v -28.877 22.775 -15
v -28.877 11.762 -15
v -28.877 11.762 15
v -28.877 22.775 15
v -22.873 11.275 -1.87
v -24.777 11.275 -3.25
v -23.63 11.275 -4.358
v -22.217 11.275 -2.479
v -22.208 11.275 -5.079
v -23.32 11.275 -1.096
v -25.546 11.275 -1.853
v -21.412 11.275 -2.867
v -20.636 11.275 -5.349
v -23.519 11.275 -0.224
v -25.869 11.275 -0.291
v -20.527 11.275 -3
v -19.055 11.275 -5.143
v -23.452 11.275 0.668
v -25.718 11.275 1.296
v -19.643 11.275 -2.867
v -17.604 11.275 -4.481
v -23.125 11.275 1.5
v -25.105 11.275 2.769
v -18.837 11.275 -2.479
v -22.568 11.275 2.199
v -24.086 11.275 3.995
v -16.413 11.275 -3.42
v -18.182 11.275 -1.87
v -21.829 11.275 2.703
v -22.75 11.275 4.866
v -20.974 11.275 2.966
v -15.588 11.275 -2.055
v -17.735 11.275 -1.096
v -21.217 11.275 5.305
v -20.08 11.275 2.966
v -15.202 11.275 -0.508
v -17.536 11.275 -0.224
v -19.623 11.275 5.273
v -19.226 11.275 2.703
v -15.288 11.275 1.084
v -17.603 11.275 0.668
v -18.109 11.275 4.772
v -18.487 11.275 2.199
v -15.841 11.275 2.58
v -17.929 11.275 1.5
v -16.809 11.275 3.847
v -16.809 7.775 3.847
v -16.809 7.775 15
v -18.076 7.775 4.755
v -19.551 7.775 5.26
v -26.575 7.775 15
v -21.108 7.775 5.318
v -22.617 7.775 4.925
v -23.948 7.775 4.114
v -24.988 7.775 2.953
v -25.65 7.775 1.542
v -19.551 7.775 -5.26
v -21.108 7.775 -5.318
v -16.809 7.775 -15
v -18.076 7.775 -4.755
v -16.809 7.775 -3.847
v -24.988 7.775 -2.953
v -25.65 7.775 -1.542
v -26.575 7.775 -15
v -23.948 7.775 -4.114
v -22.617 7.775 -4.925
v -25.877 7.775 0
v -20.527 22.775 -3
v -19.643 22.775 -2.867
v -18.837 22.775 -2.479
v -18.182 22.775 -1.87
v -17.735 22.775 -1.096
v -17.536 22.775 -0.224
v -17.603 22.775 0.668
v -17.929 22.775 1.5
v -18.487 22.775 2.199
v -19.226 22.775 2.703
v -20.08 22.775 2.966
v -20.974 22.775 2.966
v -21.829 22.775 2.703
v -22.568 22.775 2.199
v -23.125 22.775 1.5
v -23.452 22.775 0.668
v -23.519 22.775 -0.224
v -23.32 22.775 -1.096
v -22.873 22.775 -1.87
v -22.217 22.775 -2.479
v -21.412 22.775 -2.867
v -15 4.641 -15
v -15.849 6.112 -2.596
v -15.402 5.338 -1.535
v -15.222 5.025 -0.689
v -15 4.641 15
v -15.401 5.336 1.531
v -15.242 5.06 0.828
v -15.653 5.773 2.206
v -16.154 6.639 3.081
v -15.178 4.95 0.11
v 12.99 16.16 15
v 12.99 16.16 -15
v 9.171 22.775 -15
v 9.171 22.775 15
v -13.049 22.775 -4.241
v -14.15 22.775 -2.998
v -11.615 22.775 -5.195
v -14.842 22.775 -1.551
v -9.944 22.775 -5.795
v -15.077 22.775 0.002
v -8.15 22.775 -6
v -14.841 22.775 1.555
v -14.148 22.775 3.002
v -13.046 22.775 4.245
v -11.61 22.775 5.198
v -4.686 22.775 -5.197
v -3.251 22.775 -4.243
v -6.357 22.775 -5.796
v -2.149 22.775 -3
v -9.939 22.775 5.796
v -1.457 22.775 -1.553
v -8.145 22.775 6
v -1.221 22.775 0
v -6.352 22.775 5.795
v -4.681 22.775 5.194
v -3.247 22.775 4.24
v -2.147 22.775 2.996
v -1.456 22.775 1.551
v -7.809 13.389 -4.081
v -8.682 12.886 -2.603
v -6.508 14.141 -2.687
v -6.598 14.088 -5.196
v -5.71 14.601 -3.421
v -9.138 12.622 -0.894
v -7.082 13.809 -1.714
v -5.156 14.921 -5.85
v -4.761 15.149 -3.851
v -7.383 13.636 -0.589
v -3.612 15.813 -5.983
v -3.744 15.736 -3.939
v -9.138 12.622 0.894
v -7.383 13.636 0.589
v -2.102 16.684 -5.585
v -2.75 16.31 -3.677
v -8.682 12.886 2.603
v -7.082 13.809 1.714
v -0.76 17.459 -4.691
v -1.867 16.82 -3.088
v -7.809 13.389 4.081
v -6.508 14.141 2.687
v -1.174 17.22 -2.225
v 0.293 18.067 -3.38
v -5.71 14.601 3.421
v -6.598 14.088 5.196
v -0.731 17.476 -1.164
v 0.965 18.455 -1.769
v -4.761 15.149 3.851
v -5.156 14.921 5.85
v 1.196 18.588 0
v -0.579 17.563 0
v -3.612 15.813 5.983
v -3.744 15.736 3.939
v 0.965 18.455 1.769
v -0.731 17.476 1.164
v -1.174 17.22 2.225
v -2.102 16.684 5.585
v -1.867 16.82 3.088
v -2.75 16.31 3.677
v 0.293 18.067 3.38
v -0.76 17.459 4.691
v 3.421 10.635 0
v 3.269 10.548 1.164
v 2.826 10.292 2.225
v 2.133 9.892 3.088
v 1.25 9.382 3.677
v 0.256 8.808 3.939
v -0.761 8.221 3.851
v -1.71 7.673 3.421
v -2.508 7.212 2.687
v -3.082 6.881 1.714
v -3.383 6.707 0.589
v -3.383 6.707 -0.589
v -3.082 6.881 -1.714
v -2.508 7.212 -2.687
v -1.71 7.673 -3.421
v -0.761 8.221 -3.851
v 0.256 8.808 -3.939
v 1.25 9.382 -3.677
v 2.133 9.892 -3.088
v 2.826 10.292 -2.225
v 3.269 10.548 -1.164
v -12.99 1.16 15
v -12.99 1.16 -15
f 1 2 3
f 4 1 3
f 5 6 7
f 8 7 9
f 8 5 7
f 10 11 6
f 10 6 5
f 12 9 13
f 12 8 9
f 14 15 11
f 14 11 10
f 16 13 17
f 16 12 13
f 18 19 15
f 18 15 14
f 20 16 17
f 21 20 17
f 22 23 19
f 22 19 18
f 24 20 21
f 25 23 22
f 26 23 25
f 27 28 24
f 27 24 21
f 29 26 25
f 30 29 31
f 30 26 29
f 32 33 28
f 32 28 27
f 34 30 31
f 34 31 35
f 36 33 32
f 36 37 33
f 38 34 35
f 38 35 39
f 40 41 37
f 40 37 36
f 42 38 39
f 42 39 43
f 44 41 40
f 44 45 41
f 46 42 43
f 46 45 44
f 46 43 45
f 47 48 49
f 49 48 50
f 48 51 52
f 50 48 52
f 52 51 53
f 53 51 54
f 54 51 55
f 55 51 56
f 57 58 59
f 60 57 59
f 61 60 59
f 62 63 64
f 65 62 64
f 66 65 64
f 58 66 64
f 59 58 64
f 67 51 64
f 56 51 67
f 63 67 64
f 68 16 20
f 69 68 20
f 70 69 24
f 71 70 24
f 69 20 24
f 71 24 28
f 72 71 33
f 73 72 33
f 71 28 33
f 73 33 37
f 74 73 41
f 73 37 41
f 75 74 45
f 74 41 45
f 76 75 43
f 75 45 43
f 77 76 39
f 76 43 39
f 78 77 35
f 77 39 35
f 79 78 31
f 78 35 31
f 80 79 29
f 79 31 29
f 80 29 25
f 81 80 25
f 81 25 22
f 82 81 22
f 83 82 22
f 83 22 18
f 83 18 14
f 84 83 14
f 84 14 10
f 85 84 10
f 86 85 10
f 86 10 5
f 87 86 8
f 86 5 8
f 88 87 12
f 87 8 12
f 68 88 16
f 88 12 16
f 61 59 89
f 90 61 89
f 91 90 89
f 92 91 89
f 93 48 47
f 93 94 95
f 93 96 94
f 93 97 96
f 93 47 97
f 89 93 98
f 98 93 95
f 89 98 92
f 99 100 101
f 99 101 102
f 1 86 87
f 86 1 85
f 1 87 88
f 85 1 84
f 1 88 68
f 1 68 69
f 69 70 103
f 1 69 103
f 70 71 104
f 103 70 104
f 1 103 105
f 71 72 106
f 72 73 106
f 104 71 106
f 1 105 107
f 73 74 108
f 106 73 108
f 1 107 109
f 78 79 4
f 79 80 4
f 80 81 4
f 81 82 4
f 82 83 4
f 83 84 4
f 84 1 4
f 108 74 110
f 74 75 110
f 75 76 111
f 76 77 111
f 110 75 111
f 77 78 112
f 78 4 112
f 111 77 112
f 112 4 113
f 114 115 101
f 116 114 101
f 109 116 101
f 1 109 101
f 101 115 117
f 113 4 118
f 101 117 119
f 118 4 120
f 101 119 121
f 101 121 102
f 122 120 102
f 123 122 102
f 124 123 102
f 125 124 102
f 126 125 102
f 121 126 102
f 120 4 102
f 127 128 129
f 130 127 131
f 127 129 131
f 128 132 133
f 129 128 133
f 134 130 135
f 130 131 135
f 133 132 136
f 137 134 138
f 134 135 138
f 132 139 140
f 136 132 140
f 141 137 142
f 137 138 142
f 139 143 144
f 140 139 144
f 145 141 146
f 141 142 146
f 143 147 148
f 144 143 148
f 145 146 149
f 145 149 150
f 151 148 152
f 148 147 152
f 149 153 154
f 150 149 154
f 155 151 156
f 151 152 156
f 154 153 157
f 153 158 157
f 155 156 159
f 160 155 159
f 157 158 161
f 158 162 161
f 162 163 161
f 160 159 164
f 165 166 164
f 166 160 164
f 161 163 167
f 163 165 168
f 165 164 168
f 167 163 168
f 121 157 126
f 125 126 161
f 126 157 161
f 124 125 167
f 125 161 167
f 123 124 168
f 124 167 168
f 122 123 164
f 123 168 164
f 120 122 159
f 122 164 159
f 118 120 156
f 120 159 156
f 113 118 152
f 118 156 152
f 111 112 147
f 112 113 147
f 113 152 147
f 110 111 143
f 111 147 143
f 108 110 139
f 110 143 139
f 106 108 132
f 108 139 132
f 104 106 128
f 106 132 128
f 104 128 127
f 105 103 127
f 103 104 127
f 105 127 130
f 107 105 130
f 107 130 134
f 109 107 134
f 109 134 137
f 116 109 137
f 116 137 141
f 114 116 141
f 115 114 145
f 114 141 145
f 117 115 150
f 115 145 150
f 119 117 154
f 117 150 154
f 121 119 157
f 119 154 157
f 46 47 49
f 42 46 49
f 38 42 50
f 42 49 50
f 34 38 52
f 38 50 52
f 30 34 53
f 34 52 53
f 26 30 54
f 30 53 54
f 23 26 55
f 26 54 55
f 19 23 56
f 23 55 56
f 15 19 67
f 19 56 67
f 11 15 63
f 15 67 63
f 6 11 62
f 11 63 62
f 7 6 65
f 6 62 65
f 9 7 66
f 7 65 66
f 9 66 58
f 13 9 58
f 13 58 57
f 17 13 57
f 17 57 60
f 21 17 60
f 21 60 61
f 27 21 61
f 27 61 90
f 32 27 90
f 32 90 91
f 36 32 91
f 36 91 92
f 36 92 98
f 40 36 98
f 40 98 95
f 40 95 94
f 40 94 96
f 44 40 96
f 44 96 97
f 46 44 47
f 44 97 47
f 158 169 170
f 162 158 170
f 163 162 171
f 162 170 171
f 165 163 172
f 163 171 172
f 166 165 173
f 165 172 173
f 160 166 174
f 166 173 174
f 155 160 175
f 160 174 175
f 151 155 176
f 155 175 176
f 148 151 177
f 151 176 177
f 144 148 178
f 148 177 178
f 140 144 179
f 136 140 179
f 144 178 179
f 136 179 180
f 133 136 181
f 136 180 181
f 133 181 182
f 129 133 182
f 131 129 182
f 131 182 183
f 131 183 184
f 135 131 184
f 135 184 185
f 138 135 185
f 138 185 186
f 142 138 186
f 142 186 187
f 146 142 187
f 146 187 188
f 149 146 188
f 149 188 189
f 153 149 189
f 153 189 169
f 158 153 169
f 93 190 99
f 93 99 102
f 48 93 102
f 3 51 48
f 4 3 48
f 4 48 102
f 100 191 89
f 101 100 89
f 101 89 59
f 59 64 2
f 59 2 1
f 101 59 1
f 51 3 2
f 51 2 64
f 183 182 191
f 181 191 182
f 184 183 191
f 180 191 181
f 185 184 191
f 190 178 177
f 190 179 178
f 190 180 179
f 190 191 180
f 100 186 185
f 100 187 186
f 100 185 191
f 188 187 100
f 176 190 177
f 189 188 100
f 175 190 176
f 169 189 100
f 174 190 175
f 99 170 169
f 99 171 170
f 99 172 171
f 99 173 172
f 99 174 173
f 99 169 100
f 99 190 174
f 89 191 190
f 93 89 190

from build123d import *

# Parameters (mm, degrees)
ESBO_O1_W                  = 30
ESBO_O1_H                  = 30
RESSALTO_EXTRUS_O1_DEPTH   = 22.775
CORTE_EXTRUS_O1_DEPTH      = 41.542577927
ESBO_O3_OUTSIDE_W          = 48.998
ESBO_O3_OUTSIDE_H          = 41.63
ESBO_O3_OUTSIDE_W_2        = 30
ESBO_O3_OUTSIDE_H_2        = 30
CORTE_EXTRUS_O2_DEPTH      = 30.010251575
RESSALTO_EXTRUS_O2_DEPTH   = 30
ESBO_O5_R                  = 3.95
CORTE_EXTRUS_O3_DEPTH      = 32.012511133
CORTE_EXTRUS_O5_START      = -8
ESBO_O8_R                  = 6
CORTE_EXTRUS_O5_DEPTH      = 25
ESBO_O9_R                  = 3.95
CORTE_EXTRUS_O6_DEPTH      = 10
RESSALTO_EXTRUS_O3_DEPTH   = 15
ESBO_O11_W                 = 30
ESBO_O11_H                 = 15
RESSALTO_EXTRUS_O4_DEPTH   = 10
ESBO_O9_2_R                = 3.95
CORTE_EXTRUS_O7_DEPTH      = 30
ESBO_O12_R                 = 5.35
CORTE_EXTRUS_O8_DEPTH      = 10
CORTE_EXTRUS_O8_DEPTH_BACK = 3.5
ESBO_O13_W                 = 11.908257902
ESBO_O13_H                 = 30
CORTE_EXTRUS_O9_DEPTH      = 23.5
ESBO_O14_R                 = 3.95
ESBO_O14_R_2               = 3
RESSALTO_EXTRUS_O5_DEPTH   = 11.5
CORTE_EXTRUS_O10_DEPTH     = 30


with BuildPart() as part:
    # Esboço1 → Ressalto-extrusão1 (new body)
    with BuildSketch(Plane(origin=(0, 0, 0), x_dir=(1, 0, 0), z_dir=(0, 1, 0))):
        Rectangle(ESBO_O1_W, ESBO_O1_H)
    extrude(amount=RESSALTO_EXTRUS_O1_DEPTH)

    # Esboço2 → Corte-extrusão1 (cut, through all)
    with BuildSketch(Plane.XY.offset(15)):
        Polygon((-15, 0), (15, 17.320508076), (15, 0), align=None)
    extrude(amount=-CORTE_EXTRUS_O1_DEPTH, mode=Mode.SUBTRACT)

    # Esboço3 outside → Corte-extrusão2 (cut, through all)
    with BuildSketch(Plane(origin=(-3.75, 6.495190528, 0), x_dir=(0.8660254037844378, 0.5000000000000017, 0), z_dir=(0.5000000000000016, -0.8660254037844377, 0))):
        with Locations((5.694, 0)):
            Rectangle(ESBO_O3_OUTSIDE_W, ESBO_O3_OUTSIDE_H)
        with Locations((4.330127019, 0)):
            Rectangle(ESBO_O3_OUTSIDE_W_2, ESBO_O3_OUTSIDE_H_2, mode=Mode.SUBTRACT)
    extrude(amount=-CORTE_EXTRUS_O2_DEPTH, mode=Mode.SUBTRACT)

    # Esboço4 → Ressalto-extrusão2 (add)
    with BuildSketch(Plane.XY.offset(15)):
        Polygon((-25.469660456, 22.775), (-15, 4.641016151), (-15, 22.775), align=None)
    extrude(amount=-RESSALTO_EXTRUS_O2_DEPTH)

    # Esboço5 → Corte-extrusão3 (cut, through all)
    with BuildSketch(Plane(origin=(-3.75, 6.495190528, 0), x_dir=(-0.8660254037844379, -0.5000000000000013, 0), z_dir=(0.5000000000000013, -0.8660254037844379, 0))):
        with Locations(Location((-4.330131096, -4.077e-06, 0), (0, 0, 180))):
            Circle(ESBO_O5_R)
    extrude(amount=-CORTE_EXTRUS_O3_DEPTH, mode=Mode.SUBTRACT)

    # Esboço8 → Corte-extrusão5 (cut)
    with BuildSketch(Plane(origin=(-3.75, 6.495190528, 0), x_dir=(0.8660254037844379, 0.5000000000000013, 0), z_dir=(0.5000000000000013, -0.8660254037844379, 0)).offset(CORTE_EXTRUS_O5_START)):
        with Locations((4.330131096, 4.077e-06)):
            Circle(ESBO_O8_R)
    extrude(amount=-CORTE_EXTRUS_O5_DEPTH, mode=Mode.SUBTRACT)

    # Esboço9 → Corte-extrusão6 (cut)
    with BuildSketch(Plane(origin=(0, 22.775, 0), x_dir=(1, 0, 0), z_dir=(0, 1, 0))):
        with Locations(Location((-20.527350903, 0, 0), (0, 0, 270))):
            Circle(ESBO_O9_R)
    extrude(amount=-CORTE_EXTRUS_O6_DEPTH, mode=Mode.SUBTRACT)



with BuildPart() as body_2:
    # Esboço10 → Ressalto-extrusão3 (new body)
    with BuildSketch(Plane(origin=(0, 22.775, 0), x_dir=(1, 0, 0), z_dir=(0, 1, 0))):
        Polygon((-25.469660456, 15), (-40.785608805, 15), (-40.785608805, -15), (-25.469660456, -15), (-25.469660456, -3.937347933), (-25.469660456, 3.937339779), align=None)
    extrude(amount=-RESSALTO_EXTRUS_O3_DEPTH)


with BuildPart() as part_1:
    add(part.part)

    add(body_2.part)  # Ressalto-extrusão4 merges body 2
    # Esboço11 → Ressalto-extrusão4 (add)
    with BuildSketch(Plane(origin=(-25.469660456, 0, 0), x_dir=(0, 0, -1), z_dir=(1, 0, 0))):
        with Locations((0, 15.275)):
            Rectangle(ESBO_O11_W, ESBO_O11_H)
    extrude(amount=RESSALTO_EXTRUS_O4_DEPTH)

    # Esboço9<2> → Corte-extrusão7 (cut)
    with BuildSketch(Plane(origin=(0, 22.775, 0), x_dir=(1, 0, 0), z_dir=(0, 1, 0))):
        with Locations(Location((-20.527350903, 0, 0), (0, 0, 270))):
            Circle(ESBO_O9_2_R)
    extrude(amount=-CORTE_EXTRUS_O7_DEPTH, mode=Mode.SUBTRACT)

    # Esboço12 → Corte-extrusão8 (cut, two sides)
    with BuildSketch(Plane.XZ.offset(-7.775)) as corte_extrus_o8_sk:
        with Locations(Location((-20.527350903, 0, 0), (0, 0, 45.977333205))):
            Circle(ESBO_O12_R)
    extrude(amount=CORTE_EXTRUS_O8_DEPTH, mode=Mode.SUBTRACT)
    extrude(corte_extrus_o8_sk.sketch, amount=-CORTE_EXTRUS_O8_DEPTH_BACK, mode=Mode.SUBTRACT)

    # Esboço13 → Corte-extrusão9 (cut)
    with BuildSketch(Plane.XZ.offset(-7.775)):
        with Locations((-34.831479854, 0)):
            Rectangle(ESBO_O13_W, ESBO_O13_H)
    extrude(amount=-CORTE_EXTRUS_O9_DEPTH, mode=Mode.SUBTRACT)

    # Esboço14 → Ressalto-extrusão5 (add)
    with BuildSketch(Plane.XZ.offset(-11.275)):
        with Locations((-20.527350903, 0)):
            Circle(ESBO_O14_R)
        with Locations(Location((-20.527350903, 0, 0), (0, 0, 270))):
            Circle(ESBO_O14_R_2, mode=Mode.SUBTRACT)
    extrude(amount=-RESSALTO_EXTRUS_O5_DEPTH)

    # Esboço15 → Corte-extrusão10 (cut)
    with BuildSketch(Plane.XY.offset(15)):
        Polygon((-38.655450544, 28.698110147), (-22.922361913, 1.447601278), (-38.655450544, 1.447601278), align=None)
    extrude(amount=-CORTE_EXTRUS_O10_DEPTH, mode=Mode.SUBTRACT)


solid = part_1.part
